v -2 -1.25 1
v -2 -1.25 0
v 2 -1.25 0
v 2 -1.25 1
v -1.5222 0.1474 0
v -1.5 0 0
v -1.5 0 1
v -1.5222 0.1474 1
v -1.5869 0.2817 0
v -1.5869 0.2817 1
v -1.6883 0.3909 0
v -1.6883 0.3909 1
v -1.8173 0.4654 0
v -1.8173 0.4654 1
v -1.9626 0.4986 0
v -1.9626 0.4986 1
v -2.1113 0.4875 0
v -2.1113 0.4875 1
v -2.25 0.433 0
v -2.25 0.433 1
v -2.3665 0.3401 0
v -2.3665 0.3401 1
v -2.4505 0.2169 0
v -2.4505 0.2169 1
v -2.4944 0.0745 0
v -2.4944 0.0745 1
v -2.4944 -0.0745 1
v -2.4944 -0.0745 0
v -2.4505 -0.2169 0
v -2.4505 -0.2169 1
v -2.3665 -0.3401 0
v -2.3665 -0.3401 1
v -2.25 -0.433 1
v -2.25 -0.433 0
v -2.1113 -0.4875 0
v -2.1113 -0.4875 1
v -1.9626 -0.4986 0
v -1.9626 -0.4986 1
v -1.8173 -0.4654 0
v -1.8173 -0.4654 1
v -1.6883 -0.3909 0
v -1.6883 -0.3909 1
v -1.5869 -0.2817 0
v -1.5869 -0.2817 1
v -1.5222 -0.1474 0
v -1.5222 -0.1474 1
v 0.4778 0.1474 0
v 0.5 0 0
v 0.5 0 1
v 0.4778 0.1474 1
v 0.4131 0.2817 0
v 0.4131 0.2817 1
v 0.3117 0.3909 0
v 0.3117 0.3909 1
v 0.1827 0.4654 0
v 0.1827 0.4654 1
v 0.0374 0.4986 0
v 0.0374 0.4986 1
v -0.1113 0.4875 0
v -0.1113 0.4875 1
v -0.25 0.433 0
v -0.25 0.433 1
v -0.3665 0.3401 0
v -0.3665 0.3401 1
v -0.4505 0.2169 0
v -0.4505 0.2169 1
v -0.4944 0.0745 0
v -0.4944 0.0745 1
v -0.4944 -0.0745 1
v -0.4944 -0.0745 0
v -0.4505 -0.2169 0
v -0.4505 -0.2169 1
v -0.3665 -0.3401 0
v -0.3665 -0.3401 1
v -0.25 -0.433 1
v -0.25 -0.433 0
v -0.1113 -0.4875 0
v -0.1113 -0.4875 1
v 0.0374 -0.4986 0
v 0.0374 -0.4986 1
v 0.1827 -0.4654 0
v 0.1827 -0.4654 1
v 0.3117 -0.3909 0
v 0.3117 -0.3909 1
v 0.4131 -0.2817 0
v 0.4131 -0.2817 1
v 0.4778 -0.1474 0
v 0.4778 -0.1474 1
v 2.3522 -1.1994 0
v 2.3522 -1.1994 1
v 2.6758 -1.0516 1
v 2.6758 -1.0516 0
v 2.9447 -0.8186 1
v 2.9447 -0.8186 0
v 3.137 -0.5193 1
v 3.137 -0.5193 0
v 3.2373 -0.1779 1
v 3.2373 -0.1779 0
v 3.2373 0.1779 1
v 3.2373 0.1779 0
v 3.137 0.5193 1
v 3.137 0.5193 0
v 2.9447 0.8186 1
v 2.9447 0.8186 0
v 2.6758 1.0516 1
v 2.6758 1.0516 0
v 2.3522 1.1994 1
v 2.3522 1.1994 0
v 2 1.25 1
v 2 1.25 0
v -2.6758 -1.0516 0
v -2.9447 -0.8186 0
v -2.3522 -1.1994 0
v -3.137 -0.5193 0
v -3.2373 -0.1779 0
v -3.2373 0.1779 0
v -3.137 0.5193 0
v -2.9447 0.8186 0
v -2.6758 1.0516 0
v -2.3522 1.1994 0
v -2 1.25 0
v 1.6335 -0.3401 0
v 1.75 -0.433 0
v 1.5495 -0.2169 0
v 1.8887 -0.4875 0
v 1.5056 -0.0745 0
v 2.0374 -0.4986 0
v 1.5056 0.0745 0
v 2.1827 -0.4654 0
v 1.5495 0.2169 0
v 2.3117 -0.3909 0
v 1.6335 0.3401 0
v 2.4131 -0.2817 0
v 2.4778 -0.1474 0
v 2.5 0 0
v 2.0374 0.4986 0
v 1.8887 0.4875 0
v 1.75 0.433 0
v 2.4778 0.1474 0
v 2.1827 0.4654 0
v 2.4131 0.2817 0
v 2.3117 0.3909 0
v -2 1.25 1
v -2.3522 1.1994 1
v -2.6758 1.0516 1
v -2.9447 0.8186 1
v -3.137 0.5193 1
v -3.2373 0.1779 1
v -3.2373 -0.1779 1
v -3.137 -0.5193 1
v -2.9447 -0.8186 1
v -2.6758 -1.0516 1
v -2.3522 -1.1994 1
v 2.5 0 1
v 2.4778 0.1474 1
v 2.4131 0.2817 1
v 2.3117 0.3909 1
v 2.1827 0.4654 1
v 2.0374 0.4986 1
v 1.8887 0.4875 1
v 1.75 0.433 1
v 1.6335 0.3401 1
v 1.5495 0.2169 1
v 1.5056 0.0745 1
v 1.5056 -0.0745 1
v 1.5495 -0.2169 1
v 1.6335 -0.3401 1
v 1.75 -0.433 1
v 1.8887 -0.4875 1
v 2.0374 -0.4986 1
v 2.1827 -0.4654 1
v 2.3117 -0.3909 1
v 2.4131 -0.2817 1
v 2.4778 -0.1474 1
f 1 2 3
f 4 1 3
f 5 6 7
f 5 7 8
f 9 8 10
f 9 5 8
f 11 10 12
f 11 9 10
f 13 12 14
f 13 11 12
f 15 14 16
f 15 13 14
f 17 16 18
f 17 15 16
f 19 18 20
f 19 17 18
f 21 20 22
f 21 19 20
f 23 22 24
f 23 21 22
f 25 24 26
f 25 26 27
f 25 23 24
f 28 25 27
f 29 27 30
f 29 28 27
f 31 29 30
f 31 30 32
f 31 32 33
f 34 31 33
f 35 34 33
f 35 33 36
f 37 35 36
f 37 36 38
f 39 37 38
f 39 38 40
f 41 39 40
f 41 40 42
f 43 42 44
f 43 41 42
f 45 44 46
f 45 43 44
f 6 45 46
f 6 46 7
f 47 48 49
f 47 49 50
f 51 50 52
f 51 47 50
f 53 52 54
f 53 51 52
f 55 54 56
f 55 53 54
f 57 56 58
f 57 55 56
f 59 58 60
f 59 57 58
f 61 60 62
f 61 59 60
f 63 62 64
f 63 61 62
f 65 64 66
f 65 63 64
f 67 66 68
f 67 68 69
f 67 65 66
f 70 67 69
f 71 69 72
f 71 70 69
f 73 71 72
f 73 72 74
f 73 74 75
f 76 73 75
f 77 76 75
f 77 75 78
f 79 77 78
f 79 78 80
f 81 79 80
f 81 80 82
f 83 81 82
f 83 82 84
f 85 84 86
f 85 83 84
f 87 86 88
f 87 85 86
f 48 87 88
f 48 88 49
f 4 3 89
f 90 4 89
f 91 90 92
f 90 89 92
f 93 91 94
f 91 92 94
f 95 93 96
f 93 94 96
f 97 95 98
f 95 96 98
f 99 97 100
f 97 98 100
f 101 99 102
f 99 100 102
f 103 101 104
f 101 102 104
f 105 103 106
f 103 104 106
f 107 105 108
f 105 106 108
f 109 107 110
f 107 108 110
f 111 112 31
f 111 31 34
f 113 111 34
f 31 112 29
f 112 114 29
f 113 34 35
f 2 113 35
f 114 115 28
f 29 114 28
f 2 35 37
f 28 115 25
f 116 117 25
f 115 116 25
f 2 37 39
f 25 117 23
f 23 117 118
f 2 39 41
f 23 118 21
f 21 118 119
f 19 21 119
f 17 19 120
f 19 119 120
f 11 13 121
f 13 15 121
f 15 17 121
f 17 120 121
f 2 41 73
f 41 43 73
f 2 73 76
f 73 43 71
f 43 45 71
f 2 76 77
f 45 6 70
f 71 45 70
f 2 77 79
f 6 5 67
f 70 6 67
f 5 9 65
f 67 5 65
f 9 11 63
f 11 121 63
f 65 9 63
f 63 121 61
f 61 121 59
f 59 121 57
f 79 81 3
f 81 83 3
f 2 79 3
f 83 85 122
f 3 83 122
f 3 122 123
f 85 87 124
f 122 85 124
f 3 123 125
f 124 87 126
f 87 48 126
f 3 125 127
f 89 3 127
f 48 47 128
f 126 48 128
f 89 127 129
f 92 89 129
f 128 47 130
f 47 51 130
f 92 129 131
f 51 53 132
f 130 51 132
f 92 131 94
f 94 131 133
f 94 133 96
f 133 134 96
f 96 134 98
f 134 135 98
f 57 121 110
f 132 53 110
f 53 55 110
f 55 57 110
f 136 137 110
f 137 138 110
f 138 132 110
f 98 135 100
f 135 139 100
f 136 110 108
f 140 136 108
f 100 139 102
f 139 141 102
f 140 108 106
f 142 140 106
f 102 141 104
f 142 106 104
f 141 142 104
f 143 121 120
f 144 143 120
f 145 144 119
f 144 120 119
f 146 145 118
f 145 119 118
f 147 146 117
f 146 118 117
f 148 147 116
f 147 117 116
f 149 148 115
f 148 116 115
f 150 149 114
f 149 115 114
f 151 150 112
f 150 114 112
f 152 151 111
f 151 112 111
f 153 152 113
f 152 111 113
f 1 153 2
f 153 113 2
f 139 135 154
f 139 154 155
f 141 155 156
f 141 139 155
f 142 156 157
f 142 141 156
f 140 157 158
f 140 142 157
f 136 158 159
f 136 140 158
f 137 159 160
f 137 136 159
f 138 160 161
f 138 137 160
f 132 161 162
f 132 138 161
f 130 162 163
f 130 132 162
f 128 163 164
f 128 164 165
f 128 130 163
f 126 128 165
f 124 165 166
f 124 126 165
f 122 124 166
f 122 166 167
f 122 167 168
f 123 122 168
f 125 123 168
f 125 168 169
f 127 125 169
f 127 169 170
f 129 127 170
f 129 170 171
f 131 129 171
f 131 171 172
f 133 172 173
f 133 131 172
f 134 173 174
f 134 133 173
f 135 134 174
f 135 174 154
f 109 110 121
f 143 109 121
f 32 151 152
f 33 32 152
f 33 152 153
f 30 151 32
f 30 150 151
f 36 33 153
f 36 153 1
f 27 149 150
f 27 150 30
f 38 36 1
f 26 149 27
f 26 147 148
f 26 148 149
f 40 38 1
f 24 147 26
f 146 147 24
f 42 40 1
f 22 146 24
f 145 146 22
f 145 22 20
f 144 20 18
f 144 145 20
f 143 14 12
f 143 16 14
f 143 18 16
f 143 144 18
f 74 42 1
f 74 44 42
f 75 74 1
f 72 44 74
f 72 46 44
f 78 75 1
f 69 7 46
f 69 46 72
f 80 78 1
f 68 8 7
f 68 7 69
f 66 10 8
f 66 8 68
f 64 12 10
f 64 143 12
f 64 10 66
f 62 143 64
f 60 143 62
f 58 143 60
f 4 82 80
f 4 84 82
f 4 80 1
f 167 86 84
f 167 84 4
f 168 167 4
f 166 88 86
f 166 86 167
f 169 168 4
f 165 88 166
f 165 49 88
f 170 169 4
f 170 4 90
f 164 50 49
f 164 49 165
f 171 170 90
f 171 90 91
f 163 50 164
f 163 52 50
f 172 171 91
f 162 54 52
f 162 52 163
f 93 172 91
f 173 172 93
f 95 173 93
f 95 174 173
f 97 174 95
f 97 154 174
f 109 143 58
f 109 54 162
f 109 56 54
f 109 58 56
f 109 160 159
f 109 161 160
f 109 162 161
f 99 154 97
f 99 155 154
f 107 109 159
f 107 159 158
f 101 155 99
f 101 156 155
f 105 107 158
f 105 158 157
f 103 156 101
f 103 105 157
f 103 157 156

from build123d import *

# Parameters (mm, degrees)
F0_R     = 0.5
F1_DEPTH = 1


with BuildPart() as f1:
    # F0 (on Top) → F1 (new body)
    with BuildSketch(Plane.XY):
        with BuildLine():
            ThreePointArc((-2, 1.25), (-3.25, 0), (-2, -1.25))
            Line((-2, -1.25), (2, -1.25))
            ThreePointArc((2, -1.25), (3.25, 0), (2, 1.25))
            Line((2, 1.25), (-2, 1.25))
        make_face()
        with Locations((-2, 0)):
            Circle(F0_R, mode=Mode.SUBTRACT)
        Circle(F0_R, mode=Mode.SUBTRACT)
        with Locations((2, 0)):
            Circle(F0_R, mode=Mode.SUBTRACT)
    extrude(amount=F1_DEPTH)


solid = f1.part
